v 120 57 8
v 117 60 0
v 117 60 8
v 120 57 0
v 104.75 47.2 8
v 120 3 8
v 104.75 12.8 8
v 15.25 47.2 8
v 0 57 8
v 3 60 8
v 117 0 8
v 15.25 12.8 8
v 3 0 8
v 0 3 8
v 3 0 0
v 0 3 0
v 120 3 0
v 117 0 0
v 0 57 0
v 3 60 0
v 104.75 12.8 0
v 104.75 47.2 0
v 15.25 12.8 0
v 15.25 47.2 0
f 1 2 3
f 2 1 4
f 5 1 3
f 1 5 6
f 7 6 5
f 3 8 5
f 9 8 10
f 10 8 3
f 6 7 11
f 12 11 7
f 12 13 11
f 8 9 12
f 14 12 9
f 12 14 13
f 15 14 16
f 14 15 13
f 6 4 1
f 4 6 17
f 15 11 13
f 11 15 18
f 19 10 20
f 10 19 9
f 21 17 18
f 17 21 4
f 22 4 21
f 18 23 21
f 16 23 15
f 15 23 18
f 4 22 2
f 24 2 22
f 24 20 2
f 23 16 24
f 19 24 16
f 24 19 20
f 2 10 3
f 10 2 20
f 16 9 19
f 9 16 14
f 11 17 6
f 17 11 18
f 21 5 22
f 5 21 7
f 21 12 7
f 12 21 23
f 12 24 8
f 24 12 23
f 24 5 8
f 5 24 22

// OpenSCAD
$fn = 32;

// ----------------------------------------------------------------------
// Windowed plate: 1 voids, 120 x 60 x 8 mm
// ----------------------------------------------------------------------

// --- parameters (mm) ---
plate_l = 120;            // plate length, X
plate_w = 60;             // plate width, Y
plate_t = 8;              // plate thickness, Z
edge_margin = 8;          // wall from the plate edge to any window
win1_l = 89.5;            // window length
win1_w = 34.4;            // window width
depth_1 = 8;              // depth of void 1 (full thickness = through)
corner_c = 3;             // corner chamfer of the plate
fit_tol = 0.05;           // declared fit tolerance (prompt contract)
free_tol = 0.3;           // declared free tolerance (prompt contract)

profile = [[3, 0], [117, 0], [120, 3], [120, 57], [117, 60], [3, 60], [0, 57], [0, 3]];  // primary outline, 8 points, counter clockwise
void_1 = [[15.25, 12.8], [104.75, 12.8], [104.75, 47.2], [15.25, 47.2]];  // large central window, 4 points

// --- the one profile operation ---
difference() {
  linear_extrude(height = plate_t) polygon(points = profile);
  translate([0, 0, -1])
    linear_extrude(height = plate_t + 2) polygon(points = void_1);
}
